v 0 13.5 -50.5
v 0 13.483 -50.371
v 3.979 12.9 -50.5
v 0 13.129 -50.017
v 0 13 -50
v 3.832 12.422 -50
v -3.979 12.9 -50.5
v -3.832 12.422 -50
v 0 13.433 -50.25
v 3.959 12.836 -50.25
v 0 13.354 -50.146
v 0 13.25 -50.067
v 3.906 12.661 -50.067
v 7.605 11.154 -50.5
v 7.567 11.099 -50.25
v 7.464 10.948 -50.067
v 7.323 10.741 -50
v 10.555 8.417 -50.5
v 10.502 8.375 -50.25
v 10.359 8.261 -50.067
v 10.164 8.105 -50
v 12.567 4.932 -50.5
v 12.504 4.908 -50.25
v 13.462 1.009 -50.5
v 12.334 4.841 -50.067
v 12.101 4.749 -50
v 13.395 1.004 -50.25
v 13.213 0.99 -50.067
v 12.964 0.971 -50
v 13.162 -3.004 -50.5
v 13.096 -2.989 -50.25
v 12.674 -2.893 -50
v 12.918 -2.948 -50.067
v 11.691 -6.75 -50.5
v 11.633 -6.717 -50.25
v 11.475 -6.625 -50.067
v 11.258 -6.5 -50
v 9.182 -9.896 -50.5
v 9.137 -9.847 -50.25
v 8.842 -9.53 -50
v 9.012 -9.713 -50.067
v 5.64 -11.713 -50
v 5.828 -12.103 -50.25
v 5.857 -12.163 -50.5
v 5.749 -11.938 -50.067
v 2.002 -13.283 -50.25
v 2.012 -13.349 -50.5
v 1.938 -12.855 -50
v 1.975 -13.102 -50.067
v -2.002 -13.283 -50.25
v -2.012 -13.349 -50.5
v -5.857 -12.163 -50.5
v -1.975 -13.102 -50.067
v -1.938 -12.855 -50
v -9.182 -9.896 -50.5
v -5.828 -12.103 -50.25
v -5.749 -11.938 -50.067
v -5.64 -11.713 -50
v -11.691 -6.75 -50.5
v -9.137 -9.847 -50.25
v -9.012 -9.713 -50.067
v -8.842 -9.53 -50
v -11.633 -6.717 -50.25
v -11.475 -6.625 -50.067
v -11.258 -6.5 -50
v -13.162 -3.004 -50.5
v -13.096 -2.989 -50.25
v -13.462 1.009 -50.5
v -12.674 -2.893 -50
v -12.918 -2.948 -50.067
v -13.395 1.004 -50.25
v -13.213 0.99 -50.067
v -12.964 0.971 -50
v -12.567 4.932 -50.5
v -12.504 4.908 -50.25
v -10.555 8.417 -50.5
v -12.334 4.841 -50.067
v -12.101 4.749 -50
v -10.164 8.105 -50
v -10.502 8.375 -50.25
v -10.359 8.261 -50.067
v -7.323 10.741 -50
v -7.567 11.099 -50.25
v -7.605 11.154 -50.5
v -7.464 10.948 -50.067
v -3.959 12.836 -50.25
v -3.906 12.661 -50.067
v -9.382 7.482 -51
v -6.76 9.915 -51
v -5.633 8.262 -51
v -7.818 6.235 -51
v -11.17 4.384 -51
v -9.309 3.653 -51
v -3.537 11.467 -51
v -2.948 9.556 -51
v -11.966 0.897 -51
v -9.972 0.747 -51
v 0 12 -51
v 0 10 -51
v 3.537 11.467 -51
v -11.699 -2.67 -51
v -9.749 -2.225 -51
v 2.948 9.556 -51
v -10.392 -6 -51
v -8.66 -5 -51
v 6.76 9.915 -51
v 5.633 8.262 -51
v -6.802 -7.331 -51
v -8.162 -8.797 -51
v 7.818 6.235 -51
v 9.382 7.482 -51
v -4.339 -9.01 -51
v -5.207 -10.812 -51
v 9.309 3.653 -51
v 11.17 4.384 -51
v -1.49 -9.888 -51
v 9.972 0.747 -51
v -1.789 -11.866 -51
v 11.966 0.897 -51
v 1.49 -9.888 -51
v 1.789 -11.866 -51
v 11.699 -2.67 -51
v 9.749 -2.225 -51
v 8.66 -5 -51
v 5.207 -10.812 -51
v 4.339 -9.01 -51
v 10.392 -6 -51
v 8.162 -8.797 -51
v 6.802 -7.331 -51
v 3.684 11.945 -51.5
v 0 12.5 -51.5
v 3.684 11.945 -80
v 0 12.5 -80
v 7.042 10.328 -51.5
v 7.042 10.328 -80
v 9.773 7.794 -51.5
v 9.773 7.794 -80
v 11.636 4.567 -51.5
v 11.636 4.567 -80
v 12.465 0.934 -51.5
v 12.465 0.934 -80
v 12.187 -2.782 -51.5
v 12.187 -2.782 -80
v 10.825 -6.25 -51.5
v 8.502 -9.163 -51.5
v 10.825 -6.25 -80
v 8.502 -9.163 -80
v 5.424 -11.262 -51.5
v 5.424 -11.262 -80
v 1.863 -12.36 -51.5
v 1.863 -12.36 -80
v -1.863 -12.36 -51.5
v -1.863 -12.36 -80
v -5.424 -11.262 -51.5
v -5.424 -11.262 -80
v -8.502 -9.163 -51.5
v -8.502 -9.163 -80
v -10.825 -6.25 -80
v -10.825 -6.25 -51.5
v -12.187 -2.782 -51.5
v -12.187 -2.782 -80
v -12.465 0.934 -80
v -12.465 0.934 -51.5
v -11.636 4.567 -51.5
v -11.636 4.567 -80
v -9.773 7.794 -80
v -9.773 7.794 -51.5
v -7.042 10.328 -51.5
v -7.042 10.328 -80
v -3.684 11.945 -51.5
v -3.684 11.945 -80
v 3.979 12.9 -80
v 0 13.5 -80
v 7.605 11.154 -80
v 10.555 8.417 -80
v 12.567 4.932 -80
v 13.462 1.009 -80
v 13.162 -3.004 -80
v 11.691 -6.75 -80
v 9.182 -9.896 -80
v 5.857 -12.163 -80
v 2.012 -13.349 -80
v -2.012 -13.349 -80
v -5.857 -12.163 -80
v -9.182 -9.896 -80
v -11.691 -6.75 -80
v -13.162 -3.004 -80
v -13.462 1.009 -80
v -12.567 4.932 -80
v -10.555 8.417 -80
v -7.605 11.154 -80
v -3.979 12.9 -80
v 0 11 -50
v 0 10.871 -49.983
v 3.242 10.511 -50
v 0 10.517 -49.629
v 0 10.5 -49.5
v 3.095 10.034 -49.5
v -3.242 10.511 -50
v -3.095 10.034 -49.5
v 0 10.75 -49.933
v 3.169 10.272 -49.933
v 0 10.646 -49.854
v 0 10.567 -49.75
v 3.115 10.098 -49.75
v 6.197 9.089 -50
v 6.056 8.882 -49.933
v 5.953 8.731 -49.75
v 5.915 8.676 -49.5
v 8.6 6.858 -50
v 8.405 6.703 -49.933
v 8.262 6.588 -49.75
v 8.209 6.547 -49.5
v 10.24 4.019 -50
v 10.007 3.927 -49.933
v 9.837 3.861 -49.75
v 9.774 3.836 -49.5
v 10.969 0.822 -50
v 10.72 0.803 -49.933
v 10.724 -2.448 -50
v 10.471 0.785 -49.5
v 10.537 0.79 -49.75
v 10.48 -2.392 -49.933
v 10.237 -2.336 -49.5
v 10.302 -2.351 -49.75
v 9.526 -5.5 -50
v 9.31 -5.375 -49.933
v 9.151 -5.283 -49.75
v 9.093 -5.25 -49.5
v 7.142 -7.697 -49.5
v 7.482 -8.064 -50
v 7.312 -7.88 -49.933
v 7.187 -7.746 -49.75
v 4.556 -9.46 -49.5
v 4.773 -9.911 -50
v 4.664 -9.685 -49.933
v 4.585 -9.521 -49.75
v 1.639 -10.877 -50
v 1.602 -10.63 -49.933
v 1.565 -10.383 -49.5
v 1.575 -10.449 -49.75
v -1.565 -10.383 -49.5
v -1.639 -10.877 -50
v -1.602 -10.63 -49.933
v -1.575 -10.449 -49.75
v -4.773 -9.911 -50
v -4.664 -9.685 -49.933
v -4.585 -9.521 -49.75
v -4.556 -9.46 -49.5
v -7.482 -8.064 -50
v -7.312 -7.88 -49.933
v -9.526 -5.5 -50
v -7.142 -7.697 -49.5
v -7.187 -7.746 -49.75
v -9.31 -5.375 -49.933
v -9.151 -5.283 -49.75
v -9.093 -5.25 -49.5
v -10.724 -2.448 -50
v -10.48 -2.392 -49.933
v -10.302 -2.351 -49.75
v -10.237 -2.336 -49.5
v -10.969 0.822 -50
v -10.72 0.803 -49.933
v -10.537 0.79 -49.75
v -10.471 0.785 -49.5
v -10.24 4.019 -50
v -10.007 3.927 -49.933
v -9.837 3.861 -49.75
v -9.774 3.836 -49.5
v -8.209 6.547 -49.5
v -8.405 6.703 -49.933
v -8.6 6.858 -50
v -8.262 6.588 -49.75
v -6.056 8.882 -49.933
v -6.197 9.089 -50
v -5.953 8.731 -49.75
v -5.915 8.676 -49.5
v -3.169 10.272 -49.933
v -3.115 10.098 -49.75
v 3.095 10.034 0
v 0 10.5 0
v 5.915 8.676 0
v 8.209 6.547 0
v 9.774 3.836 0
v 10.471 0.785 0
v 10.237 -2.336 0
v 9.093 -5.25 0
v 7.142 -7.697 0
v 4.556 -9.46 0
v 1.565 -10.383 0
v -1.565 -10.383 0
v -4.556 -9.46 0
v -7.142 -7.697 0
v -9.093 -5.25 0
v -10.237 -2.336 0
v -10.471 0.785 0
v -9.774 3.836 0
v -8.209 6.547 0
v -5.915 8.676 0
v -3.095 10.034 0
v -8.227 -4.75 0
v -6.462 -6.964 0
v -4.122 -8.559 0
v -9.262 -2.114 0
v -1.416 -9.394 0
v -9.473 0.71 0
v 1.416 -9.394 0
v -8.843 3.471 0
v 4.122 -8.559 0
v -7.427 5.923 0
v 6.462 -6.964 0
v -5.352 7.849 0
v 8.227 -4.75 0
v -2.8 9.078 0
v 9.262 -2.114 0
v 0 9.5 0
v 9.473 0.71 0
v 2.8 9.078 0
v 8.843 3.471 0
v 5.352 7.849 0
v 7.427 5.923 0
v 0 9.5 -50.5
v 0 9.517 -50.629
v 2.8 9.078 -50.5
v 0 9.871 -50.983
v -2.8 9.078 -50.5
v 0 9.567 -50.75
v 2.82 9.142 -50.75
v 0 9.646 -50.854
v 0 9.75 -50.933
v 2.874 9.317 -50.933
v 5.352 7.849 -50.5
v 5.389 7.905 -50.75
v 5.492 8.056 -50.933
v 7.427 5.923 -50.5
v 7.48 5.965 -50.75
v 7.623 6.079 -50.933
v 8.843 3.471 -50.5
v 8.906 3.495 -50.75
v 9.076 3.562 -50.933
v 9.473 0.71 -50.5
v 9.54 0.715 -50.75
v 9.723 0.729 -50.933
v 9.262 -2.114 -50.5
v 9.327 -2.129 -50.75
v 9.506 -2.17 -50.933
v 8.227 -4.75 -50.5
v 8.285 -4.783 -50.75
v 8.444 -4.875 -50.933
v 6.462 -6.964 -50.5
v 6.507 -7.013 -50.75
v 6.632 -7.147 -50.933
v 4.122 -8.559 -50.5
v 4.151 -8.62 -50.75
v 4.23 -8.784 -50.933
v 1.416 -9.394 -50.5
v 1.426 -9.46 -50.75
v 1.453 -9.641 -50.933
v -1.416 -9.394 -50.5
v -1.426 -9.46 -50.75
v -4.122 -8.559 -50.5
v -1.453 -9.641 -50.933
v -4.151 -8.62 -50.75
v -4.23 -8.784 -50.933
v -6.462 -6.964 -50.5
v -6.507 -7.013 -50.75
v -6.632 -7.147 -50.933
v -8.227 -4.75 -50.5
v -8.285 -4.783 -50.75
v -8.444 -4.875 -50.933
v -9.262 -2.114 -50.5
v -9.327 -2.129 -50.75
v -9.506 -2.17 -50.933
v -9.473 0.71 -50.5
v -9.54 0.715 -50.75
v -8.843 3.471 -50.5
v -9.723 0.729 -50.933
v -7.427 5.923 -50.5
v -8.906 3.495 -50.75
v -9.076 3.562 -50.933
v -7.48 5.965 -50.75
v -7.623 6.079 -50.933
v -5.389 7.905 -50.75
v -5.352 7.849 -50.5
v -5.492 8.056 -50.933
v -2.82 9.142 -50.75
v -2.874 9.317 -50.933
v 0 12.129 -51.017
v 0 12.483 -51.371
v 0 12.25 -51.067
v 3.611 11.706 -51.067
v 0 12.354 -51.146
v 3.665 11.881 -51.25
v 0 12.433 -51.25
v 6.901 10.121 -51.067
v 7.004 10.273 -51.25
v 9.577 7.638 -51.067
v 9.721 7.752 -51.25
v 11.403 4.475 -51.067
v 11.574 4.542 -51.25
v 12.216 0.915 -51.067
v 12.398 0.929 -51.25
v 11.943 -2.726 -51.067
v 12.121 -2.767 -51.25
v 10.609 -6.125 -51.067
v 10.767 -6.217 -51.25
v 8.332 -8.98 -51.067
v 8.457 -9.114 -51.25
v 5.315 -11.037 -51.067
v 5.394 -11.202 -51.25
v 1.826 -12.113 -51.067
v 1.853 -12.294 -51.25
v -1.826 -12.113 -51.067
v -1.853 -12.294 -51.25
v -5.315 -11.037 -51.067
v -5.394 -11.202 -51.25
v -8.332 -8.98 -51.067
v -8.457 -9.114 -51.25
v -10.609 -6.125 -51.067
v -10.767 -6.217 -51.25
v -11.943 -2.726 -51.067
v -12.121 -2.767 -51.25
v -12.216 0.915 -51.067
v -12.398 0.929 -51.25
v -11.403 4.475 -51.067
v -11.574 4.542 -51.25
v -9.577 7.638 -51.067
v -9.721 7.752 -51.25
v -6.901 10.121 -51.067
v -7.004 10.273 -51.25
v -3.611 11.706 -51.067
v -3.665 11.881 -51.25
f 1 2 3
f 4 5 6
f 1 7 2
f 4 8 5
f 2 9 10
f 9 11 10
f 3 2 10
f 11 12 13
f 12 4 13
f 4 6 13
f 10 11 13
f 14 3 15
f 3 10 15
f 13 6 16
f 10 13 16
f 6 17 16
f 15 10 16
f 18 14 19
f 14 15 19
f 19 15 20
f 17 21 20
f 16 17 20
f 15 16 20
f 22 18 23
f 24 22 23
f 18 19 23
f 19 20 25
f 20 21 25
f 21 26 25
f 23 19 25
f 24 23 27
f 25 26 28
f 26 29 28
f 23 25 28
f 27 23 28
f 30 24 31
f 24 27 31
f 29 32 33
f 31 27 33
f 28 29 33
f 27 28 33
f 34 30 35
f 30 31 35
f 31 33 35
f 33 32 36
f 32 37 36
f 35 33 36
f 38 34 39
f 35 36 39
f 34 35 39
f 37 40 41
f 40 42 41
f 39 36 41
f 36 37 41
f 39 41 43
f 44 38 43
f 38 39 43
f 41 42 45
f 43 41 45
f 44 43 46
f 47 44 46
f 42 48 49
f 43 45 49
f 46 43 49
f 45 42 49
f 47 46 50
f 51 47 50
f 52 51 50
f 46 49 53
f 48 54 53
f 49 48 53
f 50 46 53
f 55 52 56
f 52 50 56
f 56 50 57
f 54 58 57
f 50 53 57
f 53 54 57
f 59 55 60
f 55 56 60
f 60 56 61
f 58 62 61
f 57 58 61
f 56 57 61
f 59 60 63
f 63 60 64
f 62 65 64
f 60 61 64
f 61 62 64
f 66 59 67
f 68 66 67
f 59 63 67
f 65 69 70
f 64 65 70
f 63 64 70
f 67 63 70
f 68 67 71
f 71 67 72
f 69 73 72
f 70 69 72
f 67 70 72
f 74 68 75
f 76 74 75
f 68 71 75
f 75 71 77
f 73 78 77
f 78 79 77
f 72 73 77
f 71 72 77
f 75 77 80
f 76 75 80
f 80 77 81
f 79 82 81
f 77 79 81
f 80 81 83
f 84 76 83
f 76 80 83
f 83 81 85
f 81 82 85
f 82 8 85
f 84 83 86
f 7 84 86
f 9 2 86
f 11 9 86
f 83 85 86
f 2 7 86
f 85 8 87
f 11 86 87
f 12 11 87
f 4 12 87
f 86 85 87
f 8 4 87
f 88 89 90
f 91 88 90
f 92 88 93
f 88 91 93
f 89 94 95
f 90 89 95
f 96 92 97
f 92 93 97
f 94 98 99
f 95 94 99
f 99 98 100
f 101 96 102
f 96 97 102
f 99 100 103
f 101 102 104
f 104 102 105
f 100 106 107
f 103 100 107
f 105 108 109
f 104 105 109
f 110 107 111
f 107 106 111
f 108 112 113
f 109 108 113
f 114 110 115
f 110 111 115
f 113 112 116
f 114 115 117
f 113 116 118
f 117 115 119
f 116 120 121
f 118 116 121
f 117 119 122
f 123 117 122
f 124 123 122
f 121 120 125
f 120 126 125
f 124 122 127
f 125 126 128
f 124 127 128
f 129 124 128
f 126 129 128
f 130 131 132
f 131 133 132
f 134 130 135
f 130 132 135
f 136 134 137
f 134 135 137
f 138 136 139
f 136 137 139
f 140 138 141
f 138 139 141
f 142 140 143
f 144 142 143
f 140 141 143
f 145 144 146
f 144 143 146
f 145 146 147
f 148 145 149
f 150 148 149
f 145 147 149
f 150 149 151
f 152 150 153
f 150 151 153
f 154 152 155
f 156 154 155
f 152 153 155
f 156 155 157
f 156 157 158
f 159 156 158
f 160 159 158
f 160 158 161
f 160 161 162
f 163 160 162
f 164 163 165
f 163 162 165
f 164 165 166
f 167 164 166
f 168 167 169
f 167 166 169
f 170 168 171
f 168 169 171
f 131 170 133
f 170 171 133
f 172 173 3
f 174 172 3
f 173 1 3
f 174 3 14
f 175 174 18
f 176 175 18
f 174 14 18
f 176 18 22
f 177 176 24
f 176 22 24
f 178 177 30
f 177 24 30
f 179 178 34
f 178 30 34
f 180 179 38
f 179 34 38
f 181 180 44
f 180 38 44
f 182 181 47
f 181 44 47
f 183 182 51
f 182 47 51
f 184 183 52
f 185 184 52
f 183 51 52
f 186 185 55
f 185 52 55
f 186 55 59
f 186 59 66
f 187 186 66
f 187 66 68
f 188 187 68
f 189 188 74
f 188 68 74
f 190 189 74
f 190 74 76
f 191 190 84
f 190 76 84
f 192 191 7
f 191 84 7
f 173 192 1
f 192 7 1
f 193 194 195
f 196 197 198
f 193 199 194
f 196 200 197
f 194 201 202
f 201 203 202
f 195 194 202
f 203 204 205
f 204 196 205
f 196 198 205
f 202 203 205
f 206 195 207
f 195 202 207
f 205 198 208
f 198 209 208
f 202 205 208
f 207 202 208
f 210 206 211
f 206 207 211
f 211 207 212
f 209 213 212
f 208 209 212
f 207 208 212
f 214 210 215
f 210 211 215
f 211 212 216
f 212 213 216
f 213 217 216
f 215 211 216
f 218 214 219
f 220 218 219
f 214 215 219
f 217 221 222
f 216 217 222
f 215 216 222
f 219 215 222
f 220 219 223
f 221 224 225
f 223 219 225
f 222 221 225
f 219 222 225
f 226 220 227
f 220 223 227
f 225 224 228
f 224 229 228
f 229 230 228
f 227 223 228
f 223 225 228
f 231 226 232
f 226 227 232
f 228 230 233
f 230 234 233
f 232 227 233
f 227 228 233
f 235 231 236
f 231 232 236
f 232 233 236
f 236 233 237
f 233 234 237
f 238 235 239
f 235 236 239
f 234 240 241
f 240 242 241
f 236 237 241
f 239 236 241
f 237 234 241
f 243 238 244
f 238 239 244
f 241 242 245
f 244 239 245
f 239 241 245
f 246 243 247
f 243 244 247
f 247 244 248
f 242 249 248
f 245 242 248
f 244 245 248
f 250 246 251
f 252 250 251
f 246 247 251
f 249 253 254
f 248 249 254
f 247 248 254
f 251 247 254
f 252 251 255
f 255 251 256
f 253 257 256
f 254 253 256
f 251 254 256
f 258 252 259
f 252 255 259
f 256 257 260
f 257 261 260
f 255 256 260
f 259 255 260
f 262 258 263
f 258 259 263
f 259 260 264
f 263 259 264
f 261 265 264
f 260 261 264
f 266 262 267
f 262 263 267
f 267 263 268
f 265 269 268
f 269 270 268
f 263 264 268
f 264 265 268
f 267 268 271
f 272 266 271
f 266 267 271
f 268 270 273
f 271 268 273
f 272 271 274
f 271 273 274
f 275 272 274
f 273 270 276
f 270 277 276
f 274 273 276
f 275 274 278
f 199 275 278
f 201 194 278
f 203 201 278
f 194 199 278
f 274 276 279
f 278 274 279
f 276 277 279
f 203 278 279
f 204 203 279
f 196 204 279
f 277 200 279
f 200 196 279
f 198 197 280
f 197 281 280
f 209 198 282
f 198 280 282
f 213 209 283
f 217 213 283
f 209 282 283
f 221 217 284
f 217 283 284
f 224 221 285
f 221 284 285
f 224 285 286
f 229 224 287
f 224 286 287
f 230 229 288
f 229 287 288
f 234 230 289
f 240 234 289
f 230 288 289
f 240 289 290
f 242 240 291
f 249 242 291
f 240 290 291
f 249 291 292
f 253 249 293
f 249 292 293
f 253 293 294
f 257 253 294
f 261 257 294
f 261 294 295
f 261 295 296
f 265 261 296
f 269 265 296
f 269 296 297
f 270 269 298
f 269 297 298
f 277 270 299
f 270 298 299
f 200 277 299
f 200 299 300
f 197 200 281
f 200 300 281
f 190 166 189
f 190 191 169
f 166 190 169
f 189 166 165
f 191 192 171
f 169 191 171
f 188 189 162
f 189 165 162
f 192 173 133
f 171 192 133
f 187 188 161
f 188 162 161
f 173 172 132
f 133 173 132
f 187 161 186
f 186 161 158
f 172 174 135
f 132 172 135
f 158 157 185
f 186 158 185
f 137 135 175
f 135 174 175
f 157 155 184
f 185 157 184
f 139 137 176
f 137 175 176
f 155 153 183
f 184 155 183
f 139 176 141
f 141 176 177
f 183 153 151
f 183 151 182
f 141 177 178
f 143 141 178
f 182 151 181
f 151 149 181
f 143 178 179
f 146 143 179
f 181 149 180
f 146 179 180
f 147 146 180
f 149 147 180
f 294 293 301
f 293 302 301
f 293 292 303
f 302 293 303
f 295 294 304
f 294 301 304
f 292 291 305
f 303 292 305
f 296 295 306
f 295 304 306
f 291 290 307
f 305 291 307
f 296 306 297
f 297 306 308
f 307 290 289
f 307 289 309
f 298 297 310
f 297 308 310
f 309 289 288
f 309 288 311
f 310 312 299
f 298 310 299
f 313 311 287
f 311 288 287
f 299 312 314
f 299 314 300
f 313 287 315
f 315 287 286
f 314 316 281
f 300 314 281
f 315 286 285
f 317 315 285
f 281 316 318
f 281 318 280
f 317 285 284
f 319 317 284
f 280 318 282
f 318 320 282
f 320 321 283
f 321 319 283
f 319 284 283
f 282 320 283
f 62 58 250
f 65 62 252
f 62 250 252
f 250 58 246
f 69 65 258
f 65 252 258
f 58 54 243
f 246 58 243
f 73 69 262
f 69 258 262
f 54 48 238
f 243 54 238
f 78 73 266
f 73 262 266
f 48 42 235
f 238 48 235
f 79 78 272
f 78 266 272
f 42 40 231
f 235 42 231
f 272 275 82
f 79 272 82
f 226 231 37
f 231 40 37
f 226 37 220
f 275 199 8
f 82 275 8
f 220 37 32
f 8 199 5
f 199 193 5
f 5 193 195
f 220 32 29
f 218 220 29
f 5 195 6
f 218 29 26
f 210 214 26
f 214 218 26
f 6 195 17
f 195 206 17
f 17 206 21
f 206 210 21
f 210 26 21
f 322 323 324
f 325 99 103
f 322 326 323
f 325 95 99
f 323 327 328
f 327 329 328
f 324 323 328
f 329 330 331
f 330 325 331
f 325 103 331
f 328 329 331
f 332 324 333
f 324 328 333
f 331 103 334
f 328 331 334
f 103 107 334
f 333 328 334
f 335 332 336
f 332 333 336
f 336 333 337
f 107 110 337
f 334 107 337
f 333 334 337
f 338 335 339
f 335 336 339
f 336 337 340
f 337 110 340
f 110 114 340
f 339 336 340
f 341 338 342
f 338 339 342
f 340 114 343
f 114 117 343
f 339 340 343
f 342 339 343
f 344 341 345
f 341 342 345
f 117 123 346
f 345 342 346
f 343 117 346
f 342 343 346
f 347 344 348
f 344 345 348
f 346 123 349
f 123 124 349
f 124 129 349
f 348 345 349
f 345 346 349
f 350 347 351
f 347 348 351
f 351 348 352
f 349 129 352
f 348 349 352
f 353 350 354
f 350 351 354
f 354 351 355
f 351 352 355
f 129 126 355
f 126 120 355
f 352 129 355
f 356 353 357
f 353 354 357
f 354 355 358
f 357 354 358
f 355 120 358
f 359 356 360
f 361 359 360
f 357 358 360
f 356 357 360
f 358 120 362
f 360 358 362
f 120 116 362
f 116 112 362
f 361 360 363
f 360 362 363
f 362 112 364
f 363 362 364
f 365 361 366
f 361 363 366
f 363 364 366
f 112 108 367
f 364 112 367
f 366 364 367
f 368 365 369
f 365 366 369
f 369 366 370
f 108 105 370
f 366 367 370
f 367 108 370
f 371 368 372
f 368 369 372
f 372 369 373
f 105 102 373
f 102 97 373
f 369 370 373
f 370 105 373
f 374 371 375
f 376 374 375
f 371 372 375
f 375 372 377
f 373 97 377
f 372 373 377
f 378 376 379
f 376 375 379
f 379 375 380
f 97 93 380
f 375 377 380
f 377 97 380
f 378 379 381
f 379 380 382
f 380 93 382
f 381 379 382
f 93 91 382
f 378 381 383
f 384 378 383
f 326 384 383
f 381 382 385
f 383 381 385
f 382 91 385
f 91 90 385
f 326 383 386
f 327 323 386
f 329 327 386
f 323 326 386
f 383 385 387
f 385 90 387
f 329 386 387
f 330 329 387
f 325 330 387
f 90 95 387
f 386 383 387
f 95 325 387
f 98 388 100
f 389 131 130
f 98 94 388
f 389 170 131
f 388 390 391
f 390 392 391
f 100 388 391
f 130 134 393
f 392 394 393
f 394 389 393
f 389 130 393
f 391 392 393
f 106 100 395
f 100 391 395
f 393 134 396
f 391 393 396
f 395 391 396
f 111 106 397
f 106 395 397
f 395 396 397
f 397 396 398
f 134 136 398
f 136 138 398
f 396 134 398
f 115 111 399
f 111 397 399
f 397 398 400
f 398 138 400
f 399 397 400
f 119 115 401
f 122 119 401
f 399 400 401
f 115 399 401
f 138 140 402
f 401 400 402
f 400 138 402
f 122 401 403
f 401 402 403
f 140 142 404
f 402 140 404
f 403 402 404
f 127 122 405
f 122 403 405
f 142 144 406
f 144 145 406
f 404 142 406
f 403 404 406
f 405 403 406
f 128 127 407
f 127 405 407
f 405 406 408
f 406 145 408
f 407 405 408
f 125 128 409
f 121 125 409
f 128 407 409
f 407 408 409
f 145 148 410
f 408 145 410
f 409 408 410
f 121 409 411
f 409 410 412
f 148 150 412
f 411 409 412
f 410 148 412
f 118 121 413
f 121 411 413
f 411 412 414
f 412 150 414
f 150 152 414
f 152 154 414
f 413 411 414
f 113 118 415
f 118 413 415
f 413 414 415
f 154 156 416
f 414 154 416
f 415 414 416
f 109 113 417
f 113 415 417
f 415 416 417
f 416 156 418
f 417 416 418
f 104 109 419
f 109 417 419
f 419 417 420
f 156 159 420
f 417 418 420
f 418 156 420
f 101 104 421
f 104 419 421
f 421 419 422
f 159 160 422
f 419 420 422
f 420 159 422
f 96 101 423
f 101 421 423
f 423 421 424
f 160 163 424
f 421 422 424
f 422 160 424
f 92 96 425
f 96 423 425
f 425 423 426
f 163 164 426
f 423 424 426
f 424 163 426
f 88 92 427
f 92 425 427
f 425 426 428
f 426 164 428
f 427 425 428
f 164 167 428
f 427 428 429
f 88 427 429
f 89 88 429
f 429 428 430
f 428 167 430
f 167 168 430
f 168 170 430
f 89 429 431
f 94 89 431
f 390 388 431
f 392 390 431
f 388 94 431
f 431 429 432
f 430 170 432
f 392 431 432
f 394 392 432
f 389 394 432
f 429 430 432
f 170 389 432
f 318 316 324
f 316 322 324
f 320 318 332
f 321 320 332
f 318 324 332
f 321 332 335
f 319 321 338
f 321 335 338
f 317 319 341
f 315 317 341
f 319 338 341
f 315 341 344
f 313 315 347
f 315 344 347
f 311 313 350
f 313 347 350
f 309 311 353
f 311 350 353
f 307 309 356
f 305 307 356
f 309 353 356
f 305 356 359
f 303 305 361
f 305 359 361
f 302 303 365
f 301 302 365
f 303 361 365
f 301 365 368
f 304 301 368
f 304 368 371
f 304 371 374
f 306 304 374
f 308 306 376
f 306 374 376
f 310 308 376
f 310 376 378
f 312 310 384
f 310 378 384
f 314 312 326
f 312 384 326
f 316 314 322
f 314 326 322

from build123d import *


with BuildPart() as part:
    # Sketch1 → Revolve4 (revolve)
    with BuildSketch(Plane(origin=(0, 0, 0), x_dir=(0, 0, -1), z_dir=(1, 0, 0))):
        with BuildLine():
            Line((50, 13), (50, 11))
            ThreePointArc((50, 11), (49.853553391, 10.646446609), (49.5, 10.5))
            Line((49.5, 10.5), (0, 10.5))
            Line((0, 10.5), (0, 9.5))
            Line((0, 9.5), (50.5, 9.5))
            ThreePointArc((50.5, 9.5), (50.853553391, 9.646446609), (51, 10))
            Line((51, 10), (51, 12))
            ThreePointArc((51, 12), (51.146446609, 12.353553391), (51.5, 12.5))
            Line((51.5, 12.5), (80, 12.5))
            Line((80, 12.5), (80, 13.5))
            Line((80, 13.5), (50.5, 13.5))
            ThreePointArc((50.5, 13.5), (50.146446609, 13.353553391), (50, 13))
        make_face()
    revolve(axis=Axis((0, 0, 0), (0, 0, -1)))


solid = part.part
